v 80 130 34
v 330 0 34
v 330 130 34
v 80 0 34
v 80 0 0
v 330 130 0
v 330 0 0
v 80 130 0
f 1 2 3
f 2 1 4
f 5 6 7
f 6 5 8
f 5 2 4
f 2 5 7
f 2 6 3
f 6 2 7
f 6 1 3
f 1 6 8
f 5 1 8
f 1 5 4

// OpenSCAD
// file: scad-utils/so3.scad
// so3

use <linalg.scad>

function rodrigues_so3_exp(w, A, B) = [
[1.0 - B*(w[1]*w[1] + w[2]*w[2]), B*(w[0]*w[1]) - A*w[2],          B*(w[0]*w[2]) + A*w[1]],
[B*(w[0]*w[1]) + A*w[2],          1.0 - B*(w[0]*w[0] + w[2]*w[2]), B*(w[1]*w[2]) - A*w[0]],
[B*(w[0]*w[2]) - A*w[1],          B*(w[1]*w[2]) + A*w[0],          1.0 - B*(w[0]*w[0] + w[1]*w[1])]
];

function so3_exp(w) = so3_exp_rad(w/180*PI);
function so3_exp_rad(w) =
combine_so3_exp(w,
	w*w < 1e-8 
	? so3_exp_1(w*w)
	: w*w < 1e-6
	  ? so3_exp_2(w*w)
	  : so3_exp_3(w*w));

function combine_so3_exp(w,AB) = rodrigues_so3_exp(w,AB[0],AB[1]);

// Taylor series expansions close to 0
function so3_exp_1(theta_sq) = [
	1 - 1/6*theta_sq, 
	0.5
];

function so3_exp_2(theta_sq) = [
	1.0 - theta_sq * (1.0 - theta_sq/20) / 6,
	0.5 - 0.25/6 * theta_sq
];

function so3_exp_3_0(theta_deg, inv_theta) = [
	sin(theta_deg) * inv_theta,
	(1 - cos(theta_deg)) * (inv_theta * inv_theta)
];

function so3_exp_3(theta_sq) = so3_exp_3_0(sqrt(theta_sq)*180/PI, 1/sqrt(theta_sq));


function rot_axis_part(m) = [m[2][1] - m[1][2], m[0][2] - m[2][0], m[1][0] - m[0][1]]*0.5;

function so3_ln(m) = 180/PI*so3_ln_rad(m);
function so3_ln_rad(m) = so3_ln_0(m,
	cos_angle = rot_cos_angle(m),
	preliminary_result = rot_axis_part(m));

function so3_ln_0(m, cos_angle, preliminary_result) = 
so3_ln_1(m, cos_angle, preliminary_result, 
	sin_angle_abs = sqrt(preliminary_result*preliminary_result));

function so3_ln_1(m, cos_angle, preliminary_result, sin_angle_abs) = 
	cos_angle > sqrt(1/2)
	? sin_angle_abs > 0
	  ? preliminary_result * asin(sin_angle_abs)*PI/180 / sin_angle_abs
	  : preliminary_result
	: cos_angle > -sqrt(1/2)
	  ? preliminary_result * acos(cos_angle)*PI/180 / sin_angle_abs
	  : so3_get_symmetric_part_rotation(
	      preliminary_result,
	      m,
	      angle = PI - asin(sin_angle_abs)*PI/180,
	      d0 = m[0][0] - cos_angle,
	      d1 = m[1][1] - cos_angle,
	      d2 = m[2][2] - cos_angle
			);

function so3_get_symmetric_part_rotation(preliminary_result, m, angle, d0, d1, d2) =
so3_get_symmetric_part_rotation_0(preliminary_result,angle,so3_largest_column(m, d0, d1, d2));

function so3_get_symmetric_part_rotation_0(preliminary_result, angle, c_max) =
	angle * unit(c_max * preliminary_result < 0 ? -c_max : c_max);

function so3_largest_column(m, d0, d1, d2) =
		d0*d0 > d1*d1 && d0*d0 > d2*d2
		?	[d0, (m[1][0]+m[0][1])/2, (m[0][2]+m[2][0])/2]
		: d1*d1 > d2*d2
		  ? [(m[1][0]+m[0][1])/2, d1, (m[2][1]+m[1][2])/2]
		  : [(m[0][2]+m[2][0])/2, (m[2][1]+m[1][2])/2, d2];

__so3_test = [12,-125,110];
echo(UNITTEST_so3=norm(__so3_test-so3_ln(so3_exp(__so3_test))) < 1e-8);
// file: scad-utils/lists.scad
// List helpers

/*!
  Flattens a list one level:

  flatten([[0,1],[2,3]]) => [0,1,2,3]
*/
function flatten(list) = [ for (i = list, v = i) v ];


/*!
  Creates a list from a range:

  range([0:2:6]) => [0,2,4,6]
*/
function range(r) = [ for(x=r) x ];

/*!
  Reverses a list:

  reverse([1,2,3]) => [3,2,1]
*/
function reverse(list) = [for (i = [len(list)-1:-1:0]) list[i]];

/*!
  Extracts a subarray from index begin (inclusive) to end (exclusive)
  FIXME: Change name to use list instead of array?

  subarray([1,2,3,4], 1, 2) => [2,3]
*/
function subarray(list,begin=0,end=-1) = [
    let(end = end < 0 ? len(list) : end)
      for (i = [begin : 1 : end-1])
        list[i]
];

/*!
  Returns a copy of a list with the element at index i set to x

  set([1,2,3,4], 2, 5) => [1,2,5,4]
*/
function set(list, i, x) = [for (i_=[0:len(list)-1]) i == i_ ? x : list[i_]];

/*!
  Remove element from the list by index.
  remove([4,3,2,1],1) => [4,2,1]
*/
function remove(list, i) = [for (i_=[0:1:len(list)-2]) list[i_ < i ? i_ : i_ + 1]];
// file: scad-utils/linalg.scad
// very minimal set of linalg functions needed by so3, se3 etc.

// cross and norm are builtins
//function cross(x,y) = [x[1]*y[2]-x[2]*y[1], x[2]*y[0]-x[0]*y[2], x[0]*y[1]-x[1]*y[0]];
//function norm(v) = sqrt(v*v);

function vec3(p) = len(p) < 3 ? concat(p,0) : p;
function vec4(p) = let (v3=vec3(p)) len(v3) < 4 ? concat(v3,1) : v3;
function unit(v) = v/norm(v);

function identity3()=[[1,0,0],[0,1,0],[0,0,1]];
function identity4()=[[1,0,0,0],[0,1,0,0],[0,0,1,0],[0,0,0,1]];


function take3(v) = [v[0],v[1],v[2]];
function tail3(v) = [v[3],v[4],v[5]];
function rotation_part(m) = [take3(m[0]),take3(m[1]),take3(m[2])];
function rot_trace(m) = m[0][0] + m[1][1] + m[2][2];
function rot_cos_angle(m) = (rot_trace(m)-1)/2;

function rotation_part(m) = [take3(m[0]),take3(m[1]),take3(m[2])];
function translation_part(m) = [m[0][3],m[1][3],m[2][3]];
function transpose_3(m) = [[m[0][0],m[1][0],m[2][0]],[m[0][1],m[1][1],m[2][1]],[m[0][2],m[1][2],m[2][2]]];
function transpose_4(m) = [[m[0][0],m[1][0],m[2][0],m[3][0]],
                           [m[0][1],m[1][1],m[2][1],m[3][1]],
                           [m[0][2],m[1][2],m[2][2],m[3][2]],
                           [m[0][3],m[1][3],m[2][3],m[3][3]]];
function invert_rt(m) = construct_Rt(transpose_3(rotation_part(m)), -(transpose_3(rotation_part(m)) * translation_part(m)));
function construct_Rt(R,t) = [concat(R[0],t[0]),concat(R[1],t[1]),concat(R[2],t[2]),[0,0,0,1]];

// Hadamard product of n-dimensional arrays
function hadamard(a,b) = !(len(a)>0) ? a*b : [ for(i = [0:len(a)-1]) hadamard(a[i],b[i]) ];
// file: scad-utils/se3.scad
use <linalg.scad>
use <so3.scad>

function combine_se3_exp(w, ABt) = construct_Rt(rodrigues_so3_exp(w, ABt[0], ABt[1]), ABt[2]);

// [A,B,t]
function se3_exp_1(t,w) = concat(
	so3_exp_1(w*w),
	[t + 0.5 * cross(w,t)]
);

function se3_exp_2(t,w) = se3_exp_2_0(t,w,w*w);
function se3_exp_2_0(t,w,theta_sq) =
se3_exp_23(
	so3_exp_2(theta_sq),
	C = (1.0 - theta_sq/20) / 6,
	t=t,w=w);

function se3_exp_3(t,w) = se3_exp_3_0(t,w,sqrt(w*w)*180/PI,1/sqrt(w*w));

function se3_exp_3_0(t,w,theta_deg,inv_theta) =
se3_exp_23(
	so3_exp_3_0(theta_deg = theta_deg, inv_theta = inv_theta),
	C = (1 - sin(theta_deg) * inv_theta) * (inv_theta * inv_theta),
	t=t,w=w);

function se3_exp_23(AB,C,t,w) =
[AB[0], AB[1], t + AB[1] * cross(w,t) + C * cross(w,cross(w,t)) ];

function se3_exp(mu) = se3_exp_0(t=take3(mu),w=tail3(mu)/180*PI);

function se3_exp_0(t,w) =
combine_se3_exp(w,
// Evaluate by Taylor expansion when near 0
	w*w < 1e-8
	? se3_exp_1(t,w)
	: w*w < 1e-6
	  ? se3_exp_2(t,w)
	  : se3_exp_3(t,w)
);

function se3_ln(m) = se3_ln_to_deg(se3_ln_rad(m));
function se3_ln_to_deg(v) = concat(take3(v),tail3(v)*180/PI);

function se3_ln_rad(m) = se3_ln_0(m,
	rot = so3_ln_rad(rotation_part(m)));
function se3_ln_0(m,rot) = se3_ln_1(m,rot,
	theta = sqrt(rot*rot));
function se3_ln_1(m,rot,theta) = se3_ln_2(m,rot,theta,
	shtot = theta > 0.00001 ? sin(theta/2*180/PI)/theta : 0.5,
	halfrotator = so3_exp_rad(rot * -.5));
function se3_ln_2(m,rot,theta,shtot,halfrotator) =
concat( (halfrotator * translation_part(m) -
	(theta > 0.001
	? rot * ((translation_part(m) * rot) * (1-2*shtot) / (rot*rot))
	: rot * ((translation_part(m) * rot)/24)
	)) / (2 * shtot), rot);

__se3_test = [20,-40,60,-80,100,-120];
echo(UNITTEST_se3=norm(__se3_test-se3_ln(se3_exp(__se3_test))) < 1e-8);
// file: list-comprehension-demos/util/reverse.scad
/**
* reverse.scad
*
* @copyright Justin Lin, 2019
* @license https://opensource.org/licenses/lgpl-3.0.html
*
* @see https://openhome.cc/eGossip/OpenSCAD/lib3x-reverse.html
*
**/ 

function reverse(lt) = [for(i = len(lt) - 1; i > -1; i = i - 1) lt[i]];
// file: params.scad
plate_size = [286.150000, 95.650000] ;
switch_info = [[[9.525, -9.525], 0, 1, 0], [[28.575000000000003, -9.525], 0, 1, 0], [[47.625, -9.525], 0, 1, 0], [[66.67500000000001, -9.525], 0, 1, 0], [[85.72500000000001, -9.525], 0, 1, 0], [[104.775, -9.525], 0, 1, 0], [[123.825, -9.525], 0, 1, 0], [[142.875, -9.525], 0, 1, 0], [[161.925, -9.525], 0, 1, 0], [[180.97500000000002, -9.525], 0, 1, 0], [[200.02500000000003, -9.525], 0, 1, 0], [[219.07500000000005, -9.525], 0, 1, 0], [[238.12500000000006, -9.525], 0, 1, 0], [[257.17500000000007, -9.525], 0, 1, 0], [[276.225, -9.525], 0, 1, 0], [[14.287500000000001, -28.575000000000003], 0, 1.5, 1], [[38.1, -28.575000000000003], 0, 1, 1], [[57.15, -28.575000000000003], 0, 1, 1], [[76.2, -28.575000000000003], 0, 1, 1], [[95.25, -28.575000000000003], 0, 1, 1], [[114.3, -28.575000000000003], 0, 1, 1], [[133.35, -28.575000000000003], 0, 1, 1], [[152.4, -28.575000000000003], 0, 1, 1], [[171.45000000000002, -28.575000000000003], 0, 1, 1], [[190.50000000000003, -28.575000000000003], 0, 1, 1], [[209.55000000000004, -28.575000000000003], 0, 1, 1], [[228.60000000000005, -28.575000000000003], 0, 1, 1], [[247.65000000000006, -28.575000000000003], 0, 1, 1], [[271.4625000000001, -28.575000000000003], 0, 1.5, 1], [[16.66875, -47.625], 0, 1.75, 2], [[42.8625, -47.625], 0, 1, 2], [[61.9125, -47.625], 0, 1, 2], [[80.9625, -47.625], 0, 1, 2], [[100.0125, -47.625], 0, 1, 2], [[119.0625, -47.625], 0, 1, 2], [[138.1125, -47.625], 0, 1, 2], [[157.16250000000002, -47.625], 0, 1, 2], [[176.21250000000003, -47.625], 0, 1, 2], [[195.26250000000005, -47.625], 0, 1, 2], [[214.31250000000006, -47.625], 0, 1, 2], [[233.36250000000007, -47.625], 0, 1, 2], [[264.3187500000001, -47.625], 0, 2.25, 2], [[21.431250000000002, -66.67500000000001], 0, 2.25, 3], [[52.3875, -66.67500000000001], 0, 1, 3], [[71.43750000000001, -66.67500000000001], 0, 1, 3], [[90.48750000000001, -66.67500000000001], 0, 1, 3], [[109.53750000000001, -66.67500000000001], 0, 1, 3], [[128.5875, -66.67500000000001], 0, 1, 3], [[147.63750000000002, -66.67500000000001], 0, 1, 3], [[166.68750000000003, -66.67500000000001], 0, 1, 3], [[185.73750000000004, -66.67500000000001], 0, 1, 3], [[204.78750000000005, -66.67500000000001], 0, 1, 3], [[223.83750000000006, -66.67500000000001], 0, 1, 3], [[250.03125000000006, -66.67500000000001], 0, 1.75, 3], [[276.225, -66.67500000000001], 0, 1, 3], [[38.1, -85.72500000000001], 0, 1, 4], [[61.9125, -85.72500000000001], 0, 1.5, 4], [[133.35000000000002, -85.72500000000001], 0, 6, 4], [[204.7875, -85.72500000000001], 0, 1.5, 4], [[228.6, -85.72500000000001], 0, 1, 4]] ;
// file: scad-utils/shapes.scad
function square(size) = [[-size,-size], [-size,size], [size,size], [size,-size]] / 2;

function circle(r) = [for (i=[0:$fn-1]) let (a=i*360/$fn) r * [cos(a), sin(a)]];

function regular(r, n) = circle(r, $fn=n);

function rectangle_profile(size=[1,1]) = [	
	// The first point is the anchor point, put it on the point corresponding to [cos(0),sin(0)]
	[ size[0]/2,  0], 
	[ size[0]/2,  size[1]/2],
	[-size[0]/2,  size[1]/2],
	[-size[0]/2, -size[1]/2],
	[ size[0]/2, -size[1]/2],
];

// FIXME: Move rectangle and rounded rectangle from extrusion
// file: scad-utils/transformations.scad
use <se3.scad>
use <linalg.scad>
use <lists.scad>

/*!
  Creates a rotation matrix

  xyz = euler angles = rz * ry * rx
  axis = rotation_axis * rotation_angle
*/
function rotation(xyz=undef, axis=undef) = 
	xyz != undef && axis != undef ? undef :
	xyz == undef  ? se3_exp([0,0,0,axis[0],axis[1],axis[2]]) :
	len(xyz) == undef ? rotation(axis=[0,0,xyz]) :
	(len(xyz) >= 3 ? rotation(axis=[0,0,xyz[2]]) : identity4()) *
	(len(xyz) >= 2 ? rotation(axis=[0,xyz[1],0]) : identity4()) *
	(len(xyz) >= 1 ? rotation(axis=[xyz[0],0,0]) : identity4());

/*!
  Creates a scaling matrix
*/
function scaling(v) = [
	[v[0],0,0,0],
	[0,v[1],0,0],
	[0,0,v[2],0],
	[0,0,0,1],
];

/*!
  Creates a translation matrix
*/
function translation(v) = [
	[1,0,0,v[0]],
	[0,1,0,v[1]],
	[0,0,1,v[2]],
	[0,0,0,1],
];

// Convert between cartesian and homogenous coordinates
function project(x) = subarray(x,end=len(x)-1) / x[len(x)-1];

function transform(m, list) = [for (p=list) project(m * vec4(p))];
function to_3d(list) = [ for(v = list) vec3(v) ];
// file: list-comprehension-demos/sweep.scad
/**
* sweep.scad
*
* @copyright Justin Lin, 2020
* @license https://opensource.org/licenses/lgpl-3.0.html
*
* @see https://openhome.cc/eGossip/OpenSCAD/lib3x-sweep.html
*
**/

use <util/reverse.scad>

module sweep(sections, triangles = "SOLID") {

    function side_indexes(sects, begin_idx = 0) = 
        let(       
            leng_sects = len(sects),
            leng_pts_sect = len(sects[0]),
            range_j = [begin_idx:leng_pts_sect:begin_idx + (leng_sects - 2) * leng_pts_sect],
            range_i = [0:leng_pts_sect - 1]
        ) 
        concat(
            [
                for(j = range_j, i = range_i)
                let(i2 = j + (i + 1) % leng_pts_sect)
                [
                    j + i, 
                    i2, 
                    i2 + leng_pts_sect
                ]
            ],
            [
                for(j = range_j, i = range_i)
                let(ji = j + i)
                [
                    ji, 
                    j + (i + 1) % leng_pts_sect + leng_pts_sect , 
                    ji + leng_pts_sect
                ]
            ]      
        );

    
    function the_same_after_twisting(f_sect, l_sect) =
        let(found = search([l_sect[0]], f_sect)[0], leng = len(l_sect))
        found != [] && 
        len([for(i = 0; l_sect[i] == f_sect[(found + i) % leng]; i = i + 1) undef]) == leng;

    function to_v_pts(sects) = [for(sect = sects) each sect];                   

    module solid_sections(sects) {
        leng_sects = len(sects);
        leng_pts_sect = len(sects[0]);
        first_sect = sects[0];
        last_sect = sects[leng_sects - 1];
   
        v_pts = to_v_pts(sects);

        begin_end_the_same =
            first_sect == last_sect || the_same_after_twisting(first_sect, last_sect);

        if(begin_end_the_same) {
            f_idxes = side_indexes(sects);

            polyhedron(v_pts, f_idxes); 

            // hook for testing
            test_sweep_solid(v_pts, f_idxes, triangles);
        } else {
            from = leng_pts_sect * (leng_sects - 1);
            f_idxes = [
                [each [leng_pts_sect - 1:-1:0]], 
                each side_indexes(sects), 
                [each [from:from + leng_pts_sect - 1]]
            ];
            
            polyhedron(v_pts, f_idxes);   

            // hook for testing
            test_sweep_solid(v_pts, f_idxes, triangles);             
        }
    }

    module hollow_sections(sects) {
        leng_sects = len(sects);
        leng_sect = len(sects[0]);
        half_leng_sect = leng_sect / 2;
        half_leng_v_pts = leng_sects * half_leng_sect;

        function strip_sects(begin_idx, end_idx) = 
            let(range = [begin_idx:end_idx])
            [for(sect = sects) [for(j = range) sect[j]]]; 

        range = [0:half_leng_sect - 1];
        function first_idxes() = 
            [
                for(i = range) 
                let(i3 = (i + 1) % half_leng_sect)
                [
                    i,
                    i + half_leng_v_pts,
                    i3 + half_leng_v_pts, 
                    i3
                ] 
            ];

        function last_idxes(begin_idx) = 
            [
                for(i = range) 
                let(bi = begin_idx + i, i2 = begin_idx + (i + 1) % half_leng_sect)
                [
                    bi,
                    i2,
                    i2 + half_leng_v_pts,
                    bi + half_leng_v_pts
                ]     
            ];            

        outer_sects = strip_sects(0, half_leng_sect - 1);
        inner_sects = strip_sects(half_leng_sect, leng_sect - 1);

        outer_idxes = side_indexes(outer_sects);
        inner_idxes = [for(idxes = side_indexes(inner_sects, half_leng_v_pts)) reverse(idxes)];

        first_outer_sect = outer_sects[0];
        last_outer_sect = outer_sects[leng_sects - 1];
        first_inner_sect = inner_sects[0];
        last_inner_sect = inner_sects[leng_sects - 1];
        
        leng_pts_sect = len(first_outer_sect);

        begin_end_the_same = 
           (first_outer_sect == last_outer_sect && first_inner_sect == last_inner_sect) ||
           (
               the_same_after_twisting(first_outer_sect, last_outer_sect) && 
               the_same_after_twisting(first_inner_sect, last_inner_sect)
           ); 

        v_pts = concat(to_v_pts(outer_sects), to_v_pts(inner_sects));

        if(begin_end_the_same) {
            f_idxes = concat(outer_idxes, inner_idxes);

            polyhedron(
                v_pts,
                f_idxes
            );      

            // hook for testing
            test_sweep_solid(v_pts, f_idxes, triangles);                     
        } else {
            f_idxes = concat(
                first_idxes(), 
                outer_idxes, 
                inner_idxes, 
                last_idxes(half_leng_v_pts - half_leng_sect)
            );
            
            polyhedron(
                v_pts,
                f_idxes
            ); 

            // hook for testing
            test_sweep_solid(v_pts, f_idxes, triangles);              
        }
    }
    
    module triangles_defined_sections() {
        faces = [
            [0, 1, 2], [3, 5, 4], 
            [1, 3, 4], [2, 1, 4], [2, 3, 0], 
            [0, 3, 1], [2, 4, 5], [2, 5, 3]
        ];
        module two_sections(section1, section2) {
            for(idx = triangles) {
                polyhedron(
                    concat(
                        [for(i = idx) section1[i]], 
                        [for(i = idx) section2[i]]
                    ),
                    faces
                );
            }
        }
        
        for(i = [0:len(sections) - 2]) {
             two_sections(
                 sections[i], 
                 sections[i + 1]
             );
        }
    }
    
    if(triangles == "SOLID") {
        solid_sections(sections);
    } else if(triangles == "HOLLOW") {
        hollow_sections(sections);
    }
    else {
        triangles_defined_sections();
    }
}

// override it to test

module test_sweep_solid(points, faces, triangles) {

}
// file: shape.scad
use <list-comprehension-demos/sweep.scad>
use <scad-utils/transformations.scad>
use <scad-utils/shapes.scad>
include <params.scad>

// margin as 2D vector, to be added outside of the keyboard 
margin = [3, 2];

// tilt angle of the keyboard in degree unit
tilt = 10;

// ront_height height of the keyboard at front side. overall height will be
// calculated based on front_height and tilt_angle. make sure that there is
// enough room for PCB to be placed under the keyboard.
front_height = 14;

// roundnessness radius at side
roundness = 10;

// size of material to carve
block_size = [330, 130, 34];


module shape()
{
    echo("size: ",[xmax()-xmin(), ymax()-ymin()]);
    echo("x: ", [xmin(), xmax()]);
    echo("y: ", [ymin(), ymax()]);
    echo(pow(2, 1/2));

    module side() {
        function shape(r) = [for (xy = half_circle) [xy[0]*r, xy[1]*r]];
        interval= concat(
                [for (i=[-10:20/30:10]) i],
                [for (i=[10:(py-20)/20:py-10]) i],
                [for (i=[py-10:20/20:py+10]) i]);
        transform1 = [for (i = interval)
            translation([0, i, traj(i)])
            * rotation((-90+atan(devi(i)))*x())
            * rotation(180*z())
        ];
        transform2 = [for (i = interval)
            translation([0, i, traj(i)-roundness*3])
            * rotation(-90*x())
            * scaling([1, 3, 1])
        ];
        intersection() {
            union() {
                sweep(shape(roundness), transform1);
                sweep(square(roundness*2), transform2);
            }
            translate([-roundness*2, -50]) cube([4*roundness, w+100, 50]);
        }
    }
    module proj() {
        projection() rotate(-90*y()) side();
    }

    translate(-mx*x()) side();
    rotate(90*y()) translate(-mx*z())
        linear_extrude(height=px+2*mx) proj();
    translate((px+mx)*x()) side();
    %translate([xmin(), ymin()]) cube([xmax()-xmin(), ymax()-ymin(), 36]);
}
translate(-[xmin(), ymin()]) shape();


function inch() = 25.4;
function unit() = 19.05;
function x() = [1, 0, 0];
function y() = [0, 1, 0];
function z() = [0, 0, 1];

mx = margin[0];
my = margin[1];
px = plate_size[0];
py = plate_size[1];

R = 400;
h1 = front_height;
h2 = h1 + py*sin(tilt);
w = py*cos(tilt);

p = sq(h2-h1)/sq(w);
q = (sq(w)+sq(h2)-sq(h1))/(2*(h2-h1));
r = p+1;
s = -2*(p*q+h1);
t = p*sq(q)+sq(h1)-sq(R);
b = (-s+sqrt(sq(s)-4*r*t))/(2*r);
a = -sqrt(sq(R)-sq(h1-b));

o0 = 6;
o2 = 4;

function sq(x) = pow(x, 2);
function t1(x) = b - sqrt(sq(R) - sq(x-a))-roundness;
function t0(x) =
    let(b = my)
    let(a = d1(0) / (o0*pow(-b, o0-1)))
    let(c = t1(0) - a*pow(-b, o0))
    a*pow(x-b, o0)+c;
function t2(x) = 
    let(b = w+my)
    let(a = d1(w) / (o2*pow(w-b, o2-1)))
    let(c = t1(w) - a*pow(w-b, o2))
    a*pow(x-b, o2)+c;
function d1(x) = (x-a) / sqrt(sq(R) - sq(x-a));
function d0(x) = 
    let(b = my)
    let(a = d1(0) / (o0*pow(-b, o0-1)))
    let(c = t1(0) - a*pow(-b, o0))
    o0*a*pow(x-b, o0-1);
function d2(x) = 
    let(b = w+my)
    let(a = d1(w) / (o2*pow(w-b, o2-1)))
    let(c = t1(w) - a*pow(w-b, o2))
    o2*a*pow(x-b,o2-1);
function traj(x) =
    x <= 0 ? t0(x) :
    x <= w ? t1(x) : t2(x);
function devi(x) = 
    x <= 0 ? d0(x) :
    x <= w ? d1(x) : d2(x);
function ymin() = 
    let(b = my)
    let(a = d1(0) / (o0*pow(-b, o0-1)))
    let(c = t1(0) - a*pow(-b, o0))
    -abs(pow(-c/a, 1/o0))+b-roundness;
function ymax() =
    let(b = w+my)
    let(a = d1(w) / (o2*pow(w-b, o2-1)))
    let(c = t1(w) - a*pow(w-b, o2))
    abs(pow(-c/a, 1/o2))+b+roundness;
function xmin() = -mx-roundness;
function xmax() = px+mx+roundness;
function front_height() = front_height;
function tilt() = tilt;
function plate_size() = plate_size;
function block_size() = block_size;
function block_height() = block_size[2];

half_circle = [for (i = [0 : 180/12 : 180]) [cos(i), sin(i)]];
// main file
use <shape.scad>

intersection() {
    translate(80*x())
    {
        cube([250, block_size()[1], block_size()[2]]);
        translate(-[xmin(), ymin()]) shape();
    }
}
